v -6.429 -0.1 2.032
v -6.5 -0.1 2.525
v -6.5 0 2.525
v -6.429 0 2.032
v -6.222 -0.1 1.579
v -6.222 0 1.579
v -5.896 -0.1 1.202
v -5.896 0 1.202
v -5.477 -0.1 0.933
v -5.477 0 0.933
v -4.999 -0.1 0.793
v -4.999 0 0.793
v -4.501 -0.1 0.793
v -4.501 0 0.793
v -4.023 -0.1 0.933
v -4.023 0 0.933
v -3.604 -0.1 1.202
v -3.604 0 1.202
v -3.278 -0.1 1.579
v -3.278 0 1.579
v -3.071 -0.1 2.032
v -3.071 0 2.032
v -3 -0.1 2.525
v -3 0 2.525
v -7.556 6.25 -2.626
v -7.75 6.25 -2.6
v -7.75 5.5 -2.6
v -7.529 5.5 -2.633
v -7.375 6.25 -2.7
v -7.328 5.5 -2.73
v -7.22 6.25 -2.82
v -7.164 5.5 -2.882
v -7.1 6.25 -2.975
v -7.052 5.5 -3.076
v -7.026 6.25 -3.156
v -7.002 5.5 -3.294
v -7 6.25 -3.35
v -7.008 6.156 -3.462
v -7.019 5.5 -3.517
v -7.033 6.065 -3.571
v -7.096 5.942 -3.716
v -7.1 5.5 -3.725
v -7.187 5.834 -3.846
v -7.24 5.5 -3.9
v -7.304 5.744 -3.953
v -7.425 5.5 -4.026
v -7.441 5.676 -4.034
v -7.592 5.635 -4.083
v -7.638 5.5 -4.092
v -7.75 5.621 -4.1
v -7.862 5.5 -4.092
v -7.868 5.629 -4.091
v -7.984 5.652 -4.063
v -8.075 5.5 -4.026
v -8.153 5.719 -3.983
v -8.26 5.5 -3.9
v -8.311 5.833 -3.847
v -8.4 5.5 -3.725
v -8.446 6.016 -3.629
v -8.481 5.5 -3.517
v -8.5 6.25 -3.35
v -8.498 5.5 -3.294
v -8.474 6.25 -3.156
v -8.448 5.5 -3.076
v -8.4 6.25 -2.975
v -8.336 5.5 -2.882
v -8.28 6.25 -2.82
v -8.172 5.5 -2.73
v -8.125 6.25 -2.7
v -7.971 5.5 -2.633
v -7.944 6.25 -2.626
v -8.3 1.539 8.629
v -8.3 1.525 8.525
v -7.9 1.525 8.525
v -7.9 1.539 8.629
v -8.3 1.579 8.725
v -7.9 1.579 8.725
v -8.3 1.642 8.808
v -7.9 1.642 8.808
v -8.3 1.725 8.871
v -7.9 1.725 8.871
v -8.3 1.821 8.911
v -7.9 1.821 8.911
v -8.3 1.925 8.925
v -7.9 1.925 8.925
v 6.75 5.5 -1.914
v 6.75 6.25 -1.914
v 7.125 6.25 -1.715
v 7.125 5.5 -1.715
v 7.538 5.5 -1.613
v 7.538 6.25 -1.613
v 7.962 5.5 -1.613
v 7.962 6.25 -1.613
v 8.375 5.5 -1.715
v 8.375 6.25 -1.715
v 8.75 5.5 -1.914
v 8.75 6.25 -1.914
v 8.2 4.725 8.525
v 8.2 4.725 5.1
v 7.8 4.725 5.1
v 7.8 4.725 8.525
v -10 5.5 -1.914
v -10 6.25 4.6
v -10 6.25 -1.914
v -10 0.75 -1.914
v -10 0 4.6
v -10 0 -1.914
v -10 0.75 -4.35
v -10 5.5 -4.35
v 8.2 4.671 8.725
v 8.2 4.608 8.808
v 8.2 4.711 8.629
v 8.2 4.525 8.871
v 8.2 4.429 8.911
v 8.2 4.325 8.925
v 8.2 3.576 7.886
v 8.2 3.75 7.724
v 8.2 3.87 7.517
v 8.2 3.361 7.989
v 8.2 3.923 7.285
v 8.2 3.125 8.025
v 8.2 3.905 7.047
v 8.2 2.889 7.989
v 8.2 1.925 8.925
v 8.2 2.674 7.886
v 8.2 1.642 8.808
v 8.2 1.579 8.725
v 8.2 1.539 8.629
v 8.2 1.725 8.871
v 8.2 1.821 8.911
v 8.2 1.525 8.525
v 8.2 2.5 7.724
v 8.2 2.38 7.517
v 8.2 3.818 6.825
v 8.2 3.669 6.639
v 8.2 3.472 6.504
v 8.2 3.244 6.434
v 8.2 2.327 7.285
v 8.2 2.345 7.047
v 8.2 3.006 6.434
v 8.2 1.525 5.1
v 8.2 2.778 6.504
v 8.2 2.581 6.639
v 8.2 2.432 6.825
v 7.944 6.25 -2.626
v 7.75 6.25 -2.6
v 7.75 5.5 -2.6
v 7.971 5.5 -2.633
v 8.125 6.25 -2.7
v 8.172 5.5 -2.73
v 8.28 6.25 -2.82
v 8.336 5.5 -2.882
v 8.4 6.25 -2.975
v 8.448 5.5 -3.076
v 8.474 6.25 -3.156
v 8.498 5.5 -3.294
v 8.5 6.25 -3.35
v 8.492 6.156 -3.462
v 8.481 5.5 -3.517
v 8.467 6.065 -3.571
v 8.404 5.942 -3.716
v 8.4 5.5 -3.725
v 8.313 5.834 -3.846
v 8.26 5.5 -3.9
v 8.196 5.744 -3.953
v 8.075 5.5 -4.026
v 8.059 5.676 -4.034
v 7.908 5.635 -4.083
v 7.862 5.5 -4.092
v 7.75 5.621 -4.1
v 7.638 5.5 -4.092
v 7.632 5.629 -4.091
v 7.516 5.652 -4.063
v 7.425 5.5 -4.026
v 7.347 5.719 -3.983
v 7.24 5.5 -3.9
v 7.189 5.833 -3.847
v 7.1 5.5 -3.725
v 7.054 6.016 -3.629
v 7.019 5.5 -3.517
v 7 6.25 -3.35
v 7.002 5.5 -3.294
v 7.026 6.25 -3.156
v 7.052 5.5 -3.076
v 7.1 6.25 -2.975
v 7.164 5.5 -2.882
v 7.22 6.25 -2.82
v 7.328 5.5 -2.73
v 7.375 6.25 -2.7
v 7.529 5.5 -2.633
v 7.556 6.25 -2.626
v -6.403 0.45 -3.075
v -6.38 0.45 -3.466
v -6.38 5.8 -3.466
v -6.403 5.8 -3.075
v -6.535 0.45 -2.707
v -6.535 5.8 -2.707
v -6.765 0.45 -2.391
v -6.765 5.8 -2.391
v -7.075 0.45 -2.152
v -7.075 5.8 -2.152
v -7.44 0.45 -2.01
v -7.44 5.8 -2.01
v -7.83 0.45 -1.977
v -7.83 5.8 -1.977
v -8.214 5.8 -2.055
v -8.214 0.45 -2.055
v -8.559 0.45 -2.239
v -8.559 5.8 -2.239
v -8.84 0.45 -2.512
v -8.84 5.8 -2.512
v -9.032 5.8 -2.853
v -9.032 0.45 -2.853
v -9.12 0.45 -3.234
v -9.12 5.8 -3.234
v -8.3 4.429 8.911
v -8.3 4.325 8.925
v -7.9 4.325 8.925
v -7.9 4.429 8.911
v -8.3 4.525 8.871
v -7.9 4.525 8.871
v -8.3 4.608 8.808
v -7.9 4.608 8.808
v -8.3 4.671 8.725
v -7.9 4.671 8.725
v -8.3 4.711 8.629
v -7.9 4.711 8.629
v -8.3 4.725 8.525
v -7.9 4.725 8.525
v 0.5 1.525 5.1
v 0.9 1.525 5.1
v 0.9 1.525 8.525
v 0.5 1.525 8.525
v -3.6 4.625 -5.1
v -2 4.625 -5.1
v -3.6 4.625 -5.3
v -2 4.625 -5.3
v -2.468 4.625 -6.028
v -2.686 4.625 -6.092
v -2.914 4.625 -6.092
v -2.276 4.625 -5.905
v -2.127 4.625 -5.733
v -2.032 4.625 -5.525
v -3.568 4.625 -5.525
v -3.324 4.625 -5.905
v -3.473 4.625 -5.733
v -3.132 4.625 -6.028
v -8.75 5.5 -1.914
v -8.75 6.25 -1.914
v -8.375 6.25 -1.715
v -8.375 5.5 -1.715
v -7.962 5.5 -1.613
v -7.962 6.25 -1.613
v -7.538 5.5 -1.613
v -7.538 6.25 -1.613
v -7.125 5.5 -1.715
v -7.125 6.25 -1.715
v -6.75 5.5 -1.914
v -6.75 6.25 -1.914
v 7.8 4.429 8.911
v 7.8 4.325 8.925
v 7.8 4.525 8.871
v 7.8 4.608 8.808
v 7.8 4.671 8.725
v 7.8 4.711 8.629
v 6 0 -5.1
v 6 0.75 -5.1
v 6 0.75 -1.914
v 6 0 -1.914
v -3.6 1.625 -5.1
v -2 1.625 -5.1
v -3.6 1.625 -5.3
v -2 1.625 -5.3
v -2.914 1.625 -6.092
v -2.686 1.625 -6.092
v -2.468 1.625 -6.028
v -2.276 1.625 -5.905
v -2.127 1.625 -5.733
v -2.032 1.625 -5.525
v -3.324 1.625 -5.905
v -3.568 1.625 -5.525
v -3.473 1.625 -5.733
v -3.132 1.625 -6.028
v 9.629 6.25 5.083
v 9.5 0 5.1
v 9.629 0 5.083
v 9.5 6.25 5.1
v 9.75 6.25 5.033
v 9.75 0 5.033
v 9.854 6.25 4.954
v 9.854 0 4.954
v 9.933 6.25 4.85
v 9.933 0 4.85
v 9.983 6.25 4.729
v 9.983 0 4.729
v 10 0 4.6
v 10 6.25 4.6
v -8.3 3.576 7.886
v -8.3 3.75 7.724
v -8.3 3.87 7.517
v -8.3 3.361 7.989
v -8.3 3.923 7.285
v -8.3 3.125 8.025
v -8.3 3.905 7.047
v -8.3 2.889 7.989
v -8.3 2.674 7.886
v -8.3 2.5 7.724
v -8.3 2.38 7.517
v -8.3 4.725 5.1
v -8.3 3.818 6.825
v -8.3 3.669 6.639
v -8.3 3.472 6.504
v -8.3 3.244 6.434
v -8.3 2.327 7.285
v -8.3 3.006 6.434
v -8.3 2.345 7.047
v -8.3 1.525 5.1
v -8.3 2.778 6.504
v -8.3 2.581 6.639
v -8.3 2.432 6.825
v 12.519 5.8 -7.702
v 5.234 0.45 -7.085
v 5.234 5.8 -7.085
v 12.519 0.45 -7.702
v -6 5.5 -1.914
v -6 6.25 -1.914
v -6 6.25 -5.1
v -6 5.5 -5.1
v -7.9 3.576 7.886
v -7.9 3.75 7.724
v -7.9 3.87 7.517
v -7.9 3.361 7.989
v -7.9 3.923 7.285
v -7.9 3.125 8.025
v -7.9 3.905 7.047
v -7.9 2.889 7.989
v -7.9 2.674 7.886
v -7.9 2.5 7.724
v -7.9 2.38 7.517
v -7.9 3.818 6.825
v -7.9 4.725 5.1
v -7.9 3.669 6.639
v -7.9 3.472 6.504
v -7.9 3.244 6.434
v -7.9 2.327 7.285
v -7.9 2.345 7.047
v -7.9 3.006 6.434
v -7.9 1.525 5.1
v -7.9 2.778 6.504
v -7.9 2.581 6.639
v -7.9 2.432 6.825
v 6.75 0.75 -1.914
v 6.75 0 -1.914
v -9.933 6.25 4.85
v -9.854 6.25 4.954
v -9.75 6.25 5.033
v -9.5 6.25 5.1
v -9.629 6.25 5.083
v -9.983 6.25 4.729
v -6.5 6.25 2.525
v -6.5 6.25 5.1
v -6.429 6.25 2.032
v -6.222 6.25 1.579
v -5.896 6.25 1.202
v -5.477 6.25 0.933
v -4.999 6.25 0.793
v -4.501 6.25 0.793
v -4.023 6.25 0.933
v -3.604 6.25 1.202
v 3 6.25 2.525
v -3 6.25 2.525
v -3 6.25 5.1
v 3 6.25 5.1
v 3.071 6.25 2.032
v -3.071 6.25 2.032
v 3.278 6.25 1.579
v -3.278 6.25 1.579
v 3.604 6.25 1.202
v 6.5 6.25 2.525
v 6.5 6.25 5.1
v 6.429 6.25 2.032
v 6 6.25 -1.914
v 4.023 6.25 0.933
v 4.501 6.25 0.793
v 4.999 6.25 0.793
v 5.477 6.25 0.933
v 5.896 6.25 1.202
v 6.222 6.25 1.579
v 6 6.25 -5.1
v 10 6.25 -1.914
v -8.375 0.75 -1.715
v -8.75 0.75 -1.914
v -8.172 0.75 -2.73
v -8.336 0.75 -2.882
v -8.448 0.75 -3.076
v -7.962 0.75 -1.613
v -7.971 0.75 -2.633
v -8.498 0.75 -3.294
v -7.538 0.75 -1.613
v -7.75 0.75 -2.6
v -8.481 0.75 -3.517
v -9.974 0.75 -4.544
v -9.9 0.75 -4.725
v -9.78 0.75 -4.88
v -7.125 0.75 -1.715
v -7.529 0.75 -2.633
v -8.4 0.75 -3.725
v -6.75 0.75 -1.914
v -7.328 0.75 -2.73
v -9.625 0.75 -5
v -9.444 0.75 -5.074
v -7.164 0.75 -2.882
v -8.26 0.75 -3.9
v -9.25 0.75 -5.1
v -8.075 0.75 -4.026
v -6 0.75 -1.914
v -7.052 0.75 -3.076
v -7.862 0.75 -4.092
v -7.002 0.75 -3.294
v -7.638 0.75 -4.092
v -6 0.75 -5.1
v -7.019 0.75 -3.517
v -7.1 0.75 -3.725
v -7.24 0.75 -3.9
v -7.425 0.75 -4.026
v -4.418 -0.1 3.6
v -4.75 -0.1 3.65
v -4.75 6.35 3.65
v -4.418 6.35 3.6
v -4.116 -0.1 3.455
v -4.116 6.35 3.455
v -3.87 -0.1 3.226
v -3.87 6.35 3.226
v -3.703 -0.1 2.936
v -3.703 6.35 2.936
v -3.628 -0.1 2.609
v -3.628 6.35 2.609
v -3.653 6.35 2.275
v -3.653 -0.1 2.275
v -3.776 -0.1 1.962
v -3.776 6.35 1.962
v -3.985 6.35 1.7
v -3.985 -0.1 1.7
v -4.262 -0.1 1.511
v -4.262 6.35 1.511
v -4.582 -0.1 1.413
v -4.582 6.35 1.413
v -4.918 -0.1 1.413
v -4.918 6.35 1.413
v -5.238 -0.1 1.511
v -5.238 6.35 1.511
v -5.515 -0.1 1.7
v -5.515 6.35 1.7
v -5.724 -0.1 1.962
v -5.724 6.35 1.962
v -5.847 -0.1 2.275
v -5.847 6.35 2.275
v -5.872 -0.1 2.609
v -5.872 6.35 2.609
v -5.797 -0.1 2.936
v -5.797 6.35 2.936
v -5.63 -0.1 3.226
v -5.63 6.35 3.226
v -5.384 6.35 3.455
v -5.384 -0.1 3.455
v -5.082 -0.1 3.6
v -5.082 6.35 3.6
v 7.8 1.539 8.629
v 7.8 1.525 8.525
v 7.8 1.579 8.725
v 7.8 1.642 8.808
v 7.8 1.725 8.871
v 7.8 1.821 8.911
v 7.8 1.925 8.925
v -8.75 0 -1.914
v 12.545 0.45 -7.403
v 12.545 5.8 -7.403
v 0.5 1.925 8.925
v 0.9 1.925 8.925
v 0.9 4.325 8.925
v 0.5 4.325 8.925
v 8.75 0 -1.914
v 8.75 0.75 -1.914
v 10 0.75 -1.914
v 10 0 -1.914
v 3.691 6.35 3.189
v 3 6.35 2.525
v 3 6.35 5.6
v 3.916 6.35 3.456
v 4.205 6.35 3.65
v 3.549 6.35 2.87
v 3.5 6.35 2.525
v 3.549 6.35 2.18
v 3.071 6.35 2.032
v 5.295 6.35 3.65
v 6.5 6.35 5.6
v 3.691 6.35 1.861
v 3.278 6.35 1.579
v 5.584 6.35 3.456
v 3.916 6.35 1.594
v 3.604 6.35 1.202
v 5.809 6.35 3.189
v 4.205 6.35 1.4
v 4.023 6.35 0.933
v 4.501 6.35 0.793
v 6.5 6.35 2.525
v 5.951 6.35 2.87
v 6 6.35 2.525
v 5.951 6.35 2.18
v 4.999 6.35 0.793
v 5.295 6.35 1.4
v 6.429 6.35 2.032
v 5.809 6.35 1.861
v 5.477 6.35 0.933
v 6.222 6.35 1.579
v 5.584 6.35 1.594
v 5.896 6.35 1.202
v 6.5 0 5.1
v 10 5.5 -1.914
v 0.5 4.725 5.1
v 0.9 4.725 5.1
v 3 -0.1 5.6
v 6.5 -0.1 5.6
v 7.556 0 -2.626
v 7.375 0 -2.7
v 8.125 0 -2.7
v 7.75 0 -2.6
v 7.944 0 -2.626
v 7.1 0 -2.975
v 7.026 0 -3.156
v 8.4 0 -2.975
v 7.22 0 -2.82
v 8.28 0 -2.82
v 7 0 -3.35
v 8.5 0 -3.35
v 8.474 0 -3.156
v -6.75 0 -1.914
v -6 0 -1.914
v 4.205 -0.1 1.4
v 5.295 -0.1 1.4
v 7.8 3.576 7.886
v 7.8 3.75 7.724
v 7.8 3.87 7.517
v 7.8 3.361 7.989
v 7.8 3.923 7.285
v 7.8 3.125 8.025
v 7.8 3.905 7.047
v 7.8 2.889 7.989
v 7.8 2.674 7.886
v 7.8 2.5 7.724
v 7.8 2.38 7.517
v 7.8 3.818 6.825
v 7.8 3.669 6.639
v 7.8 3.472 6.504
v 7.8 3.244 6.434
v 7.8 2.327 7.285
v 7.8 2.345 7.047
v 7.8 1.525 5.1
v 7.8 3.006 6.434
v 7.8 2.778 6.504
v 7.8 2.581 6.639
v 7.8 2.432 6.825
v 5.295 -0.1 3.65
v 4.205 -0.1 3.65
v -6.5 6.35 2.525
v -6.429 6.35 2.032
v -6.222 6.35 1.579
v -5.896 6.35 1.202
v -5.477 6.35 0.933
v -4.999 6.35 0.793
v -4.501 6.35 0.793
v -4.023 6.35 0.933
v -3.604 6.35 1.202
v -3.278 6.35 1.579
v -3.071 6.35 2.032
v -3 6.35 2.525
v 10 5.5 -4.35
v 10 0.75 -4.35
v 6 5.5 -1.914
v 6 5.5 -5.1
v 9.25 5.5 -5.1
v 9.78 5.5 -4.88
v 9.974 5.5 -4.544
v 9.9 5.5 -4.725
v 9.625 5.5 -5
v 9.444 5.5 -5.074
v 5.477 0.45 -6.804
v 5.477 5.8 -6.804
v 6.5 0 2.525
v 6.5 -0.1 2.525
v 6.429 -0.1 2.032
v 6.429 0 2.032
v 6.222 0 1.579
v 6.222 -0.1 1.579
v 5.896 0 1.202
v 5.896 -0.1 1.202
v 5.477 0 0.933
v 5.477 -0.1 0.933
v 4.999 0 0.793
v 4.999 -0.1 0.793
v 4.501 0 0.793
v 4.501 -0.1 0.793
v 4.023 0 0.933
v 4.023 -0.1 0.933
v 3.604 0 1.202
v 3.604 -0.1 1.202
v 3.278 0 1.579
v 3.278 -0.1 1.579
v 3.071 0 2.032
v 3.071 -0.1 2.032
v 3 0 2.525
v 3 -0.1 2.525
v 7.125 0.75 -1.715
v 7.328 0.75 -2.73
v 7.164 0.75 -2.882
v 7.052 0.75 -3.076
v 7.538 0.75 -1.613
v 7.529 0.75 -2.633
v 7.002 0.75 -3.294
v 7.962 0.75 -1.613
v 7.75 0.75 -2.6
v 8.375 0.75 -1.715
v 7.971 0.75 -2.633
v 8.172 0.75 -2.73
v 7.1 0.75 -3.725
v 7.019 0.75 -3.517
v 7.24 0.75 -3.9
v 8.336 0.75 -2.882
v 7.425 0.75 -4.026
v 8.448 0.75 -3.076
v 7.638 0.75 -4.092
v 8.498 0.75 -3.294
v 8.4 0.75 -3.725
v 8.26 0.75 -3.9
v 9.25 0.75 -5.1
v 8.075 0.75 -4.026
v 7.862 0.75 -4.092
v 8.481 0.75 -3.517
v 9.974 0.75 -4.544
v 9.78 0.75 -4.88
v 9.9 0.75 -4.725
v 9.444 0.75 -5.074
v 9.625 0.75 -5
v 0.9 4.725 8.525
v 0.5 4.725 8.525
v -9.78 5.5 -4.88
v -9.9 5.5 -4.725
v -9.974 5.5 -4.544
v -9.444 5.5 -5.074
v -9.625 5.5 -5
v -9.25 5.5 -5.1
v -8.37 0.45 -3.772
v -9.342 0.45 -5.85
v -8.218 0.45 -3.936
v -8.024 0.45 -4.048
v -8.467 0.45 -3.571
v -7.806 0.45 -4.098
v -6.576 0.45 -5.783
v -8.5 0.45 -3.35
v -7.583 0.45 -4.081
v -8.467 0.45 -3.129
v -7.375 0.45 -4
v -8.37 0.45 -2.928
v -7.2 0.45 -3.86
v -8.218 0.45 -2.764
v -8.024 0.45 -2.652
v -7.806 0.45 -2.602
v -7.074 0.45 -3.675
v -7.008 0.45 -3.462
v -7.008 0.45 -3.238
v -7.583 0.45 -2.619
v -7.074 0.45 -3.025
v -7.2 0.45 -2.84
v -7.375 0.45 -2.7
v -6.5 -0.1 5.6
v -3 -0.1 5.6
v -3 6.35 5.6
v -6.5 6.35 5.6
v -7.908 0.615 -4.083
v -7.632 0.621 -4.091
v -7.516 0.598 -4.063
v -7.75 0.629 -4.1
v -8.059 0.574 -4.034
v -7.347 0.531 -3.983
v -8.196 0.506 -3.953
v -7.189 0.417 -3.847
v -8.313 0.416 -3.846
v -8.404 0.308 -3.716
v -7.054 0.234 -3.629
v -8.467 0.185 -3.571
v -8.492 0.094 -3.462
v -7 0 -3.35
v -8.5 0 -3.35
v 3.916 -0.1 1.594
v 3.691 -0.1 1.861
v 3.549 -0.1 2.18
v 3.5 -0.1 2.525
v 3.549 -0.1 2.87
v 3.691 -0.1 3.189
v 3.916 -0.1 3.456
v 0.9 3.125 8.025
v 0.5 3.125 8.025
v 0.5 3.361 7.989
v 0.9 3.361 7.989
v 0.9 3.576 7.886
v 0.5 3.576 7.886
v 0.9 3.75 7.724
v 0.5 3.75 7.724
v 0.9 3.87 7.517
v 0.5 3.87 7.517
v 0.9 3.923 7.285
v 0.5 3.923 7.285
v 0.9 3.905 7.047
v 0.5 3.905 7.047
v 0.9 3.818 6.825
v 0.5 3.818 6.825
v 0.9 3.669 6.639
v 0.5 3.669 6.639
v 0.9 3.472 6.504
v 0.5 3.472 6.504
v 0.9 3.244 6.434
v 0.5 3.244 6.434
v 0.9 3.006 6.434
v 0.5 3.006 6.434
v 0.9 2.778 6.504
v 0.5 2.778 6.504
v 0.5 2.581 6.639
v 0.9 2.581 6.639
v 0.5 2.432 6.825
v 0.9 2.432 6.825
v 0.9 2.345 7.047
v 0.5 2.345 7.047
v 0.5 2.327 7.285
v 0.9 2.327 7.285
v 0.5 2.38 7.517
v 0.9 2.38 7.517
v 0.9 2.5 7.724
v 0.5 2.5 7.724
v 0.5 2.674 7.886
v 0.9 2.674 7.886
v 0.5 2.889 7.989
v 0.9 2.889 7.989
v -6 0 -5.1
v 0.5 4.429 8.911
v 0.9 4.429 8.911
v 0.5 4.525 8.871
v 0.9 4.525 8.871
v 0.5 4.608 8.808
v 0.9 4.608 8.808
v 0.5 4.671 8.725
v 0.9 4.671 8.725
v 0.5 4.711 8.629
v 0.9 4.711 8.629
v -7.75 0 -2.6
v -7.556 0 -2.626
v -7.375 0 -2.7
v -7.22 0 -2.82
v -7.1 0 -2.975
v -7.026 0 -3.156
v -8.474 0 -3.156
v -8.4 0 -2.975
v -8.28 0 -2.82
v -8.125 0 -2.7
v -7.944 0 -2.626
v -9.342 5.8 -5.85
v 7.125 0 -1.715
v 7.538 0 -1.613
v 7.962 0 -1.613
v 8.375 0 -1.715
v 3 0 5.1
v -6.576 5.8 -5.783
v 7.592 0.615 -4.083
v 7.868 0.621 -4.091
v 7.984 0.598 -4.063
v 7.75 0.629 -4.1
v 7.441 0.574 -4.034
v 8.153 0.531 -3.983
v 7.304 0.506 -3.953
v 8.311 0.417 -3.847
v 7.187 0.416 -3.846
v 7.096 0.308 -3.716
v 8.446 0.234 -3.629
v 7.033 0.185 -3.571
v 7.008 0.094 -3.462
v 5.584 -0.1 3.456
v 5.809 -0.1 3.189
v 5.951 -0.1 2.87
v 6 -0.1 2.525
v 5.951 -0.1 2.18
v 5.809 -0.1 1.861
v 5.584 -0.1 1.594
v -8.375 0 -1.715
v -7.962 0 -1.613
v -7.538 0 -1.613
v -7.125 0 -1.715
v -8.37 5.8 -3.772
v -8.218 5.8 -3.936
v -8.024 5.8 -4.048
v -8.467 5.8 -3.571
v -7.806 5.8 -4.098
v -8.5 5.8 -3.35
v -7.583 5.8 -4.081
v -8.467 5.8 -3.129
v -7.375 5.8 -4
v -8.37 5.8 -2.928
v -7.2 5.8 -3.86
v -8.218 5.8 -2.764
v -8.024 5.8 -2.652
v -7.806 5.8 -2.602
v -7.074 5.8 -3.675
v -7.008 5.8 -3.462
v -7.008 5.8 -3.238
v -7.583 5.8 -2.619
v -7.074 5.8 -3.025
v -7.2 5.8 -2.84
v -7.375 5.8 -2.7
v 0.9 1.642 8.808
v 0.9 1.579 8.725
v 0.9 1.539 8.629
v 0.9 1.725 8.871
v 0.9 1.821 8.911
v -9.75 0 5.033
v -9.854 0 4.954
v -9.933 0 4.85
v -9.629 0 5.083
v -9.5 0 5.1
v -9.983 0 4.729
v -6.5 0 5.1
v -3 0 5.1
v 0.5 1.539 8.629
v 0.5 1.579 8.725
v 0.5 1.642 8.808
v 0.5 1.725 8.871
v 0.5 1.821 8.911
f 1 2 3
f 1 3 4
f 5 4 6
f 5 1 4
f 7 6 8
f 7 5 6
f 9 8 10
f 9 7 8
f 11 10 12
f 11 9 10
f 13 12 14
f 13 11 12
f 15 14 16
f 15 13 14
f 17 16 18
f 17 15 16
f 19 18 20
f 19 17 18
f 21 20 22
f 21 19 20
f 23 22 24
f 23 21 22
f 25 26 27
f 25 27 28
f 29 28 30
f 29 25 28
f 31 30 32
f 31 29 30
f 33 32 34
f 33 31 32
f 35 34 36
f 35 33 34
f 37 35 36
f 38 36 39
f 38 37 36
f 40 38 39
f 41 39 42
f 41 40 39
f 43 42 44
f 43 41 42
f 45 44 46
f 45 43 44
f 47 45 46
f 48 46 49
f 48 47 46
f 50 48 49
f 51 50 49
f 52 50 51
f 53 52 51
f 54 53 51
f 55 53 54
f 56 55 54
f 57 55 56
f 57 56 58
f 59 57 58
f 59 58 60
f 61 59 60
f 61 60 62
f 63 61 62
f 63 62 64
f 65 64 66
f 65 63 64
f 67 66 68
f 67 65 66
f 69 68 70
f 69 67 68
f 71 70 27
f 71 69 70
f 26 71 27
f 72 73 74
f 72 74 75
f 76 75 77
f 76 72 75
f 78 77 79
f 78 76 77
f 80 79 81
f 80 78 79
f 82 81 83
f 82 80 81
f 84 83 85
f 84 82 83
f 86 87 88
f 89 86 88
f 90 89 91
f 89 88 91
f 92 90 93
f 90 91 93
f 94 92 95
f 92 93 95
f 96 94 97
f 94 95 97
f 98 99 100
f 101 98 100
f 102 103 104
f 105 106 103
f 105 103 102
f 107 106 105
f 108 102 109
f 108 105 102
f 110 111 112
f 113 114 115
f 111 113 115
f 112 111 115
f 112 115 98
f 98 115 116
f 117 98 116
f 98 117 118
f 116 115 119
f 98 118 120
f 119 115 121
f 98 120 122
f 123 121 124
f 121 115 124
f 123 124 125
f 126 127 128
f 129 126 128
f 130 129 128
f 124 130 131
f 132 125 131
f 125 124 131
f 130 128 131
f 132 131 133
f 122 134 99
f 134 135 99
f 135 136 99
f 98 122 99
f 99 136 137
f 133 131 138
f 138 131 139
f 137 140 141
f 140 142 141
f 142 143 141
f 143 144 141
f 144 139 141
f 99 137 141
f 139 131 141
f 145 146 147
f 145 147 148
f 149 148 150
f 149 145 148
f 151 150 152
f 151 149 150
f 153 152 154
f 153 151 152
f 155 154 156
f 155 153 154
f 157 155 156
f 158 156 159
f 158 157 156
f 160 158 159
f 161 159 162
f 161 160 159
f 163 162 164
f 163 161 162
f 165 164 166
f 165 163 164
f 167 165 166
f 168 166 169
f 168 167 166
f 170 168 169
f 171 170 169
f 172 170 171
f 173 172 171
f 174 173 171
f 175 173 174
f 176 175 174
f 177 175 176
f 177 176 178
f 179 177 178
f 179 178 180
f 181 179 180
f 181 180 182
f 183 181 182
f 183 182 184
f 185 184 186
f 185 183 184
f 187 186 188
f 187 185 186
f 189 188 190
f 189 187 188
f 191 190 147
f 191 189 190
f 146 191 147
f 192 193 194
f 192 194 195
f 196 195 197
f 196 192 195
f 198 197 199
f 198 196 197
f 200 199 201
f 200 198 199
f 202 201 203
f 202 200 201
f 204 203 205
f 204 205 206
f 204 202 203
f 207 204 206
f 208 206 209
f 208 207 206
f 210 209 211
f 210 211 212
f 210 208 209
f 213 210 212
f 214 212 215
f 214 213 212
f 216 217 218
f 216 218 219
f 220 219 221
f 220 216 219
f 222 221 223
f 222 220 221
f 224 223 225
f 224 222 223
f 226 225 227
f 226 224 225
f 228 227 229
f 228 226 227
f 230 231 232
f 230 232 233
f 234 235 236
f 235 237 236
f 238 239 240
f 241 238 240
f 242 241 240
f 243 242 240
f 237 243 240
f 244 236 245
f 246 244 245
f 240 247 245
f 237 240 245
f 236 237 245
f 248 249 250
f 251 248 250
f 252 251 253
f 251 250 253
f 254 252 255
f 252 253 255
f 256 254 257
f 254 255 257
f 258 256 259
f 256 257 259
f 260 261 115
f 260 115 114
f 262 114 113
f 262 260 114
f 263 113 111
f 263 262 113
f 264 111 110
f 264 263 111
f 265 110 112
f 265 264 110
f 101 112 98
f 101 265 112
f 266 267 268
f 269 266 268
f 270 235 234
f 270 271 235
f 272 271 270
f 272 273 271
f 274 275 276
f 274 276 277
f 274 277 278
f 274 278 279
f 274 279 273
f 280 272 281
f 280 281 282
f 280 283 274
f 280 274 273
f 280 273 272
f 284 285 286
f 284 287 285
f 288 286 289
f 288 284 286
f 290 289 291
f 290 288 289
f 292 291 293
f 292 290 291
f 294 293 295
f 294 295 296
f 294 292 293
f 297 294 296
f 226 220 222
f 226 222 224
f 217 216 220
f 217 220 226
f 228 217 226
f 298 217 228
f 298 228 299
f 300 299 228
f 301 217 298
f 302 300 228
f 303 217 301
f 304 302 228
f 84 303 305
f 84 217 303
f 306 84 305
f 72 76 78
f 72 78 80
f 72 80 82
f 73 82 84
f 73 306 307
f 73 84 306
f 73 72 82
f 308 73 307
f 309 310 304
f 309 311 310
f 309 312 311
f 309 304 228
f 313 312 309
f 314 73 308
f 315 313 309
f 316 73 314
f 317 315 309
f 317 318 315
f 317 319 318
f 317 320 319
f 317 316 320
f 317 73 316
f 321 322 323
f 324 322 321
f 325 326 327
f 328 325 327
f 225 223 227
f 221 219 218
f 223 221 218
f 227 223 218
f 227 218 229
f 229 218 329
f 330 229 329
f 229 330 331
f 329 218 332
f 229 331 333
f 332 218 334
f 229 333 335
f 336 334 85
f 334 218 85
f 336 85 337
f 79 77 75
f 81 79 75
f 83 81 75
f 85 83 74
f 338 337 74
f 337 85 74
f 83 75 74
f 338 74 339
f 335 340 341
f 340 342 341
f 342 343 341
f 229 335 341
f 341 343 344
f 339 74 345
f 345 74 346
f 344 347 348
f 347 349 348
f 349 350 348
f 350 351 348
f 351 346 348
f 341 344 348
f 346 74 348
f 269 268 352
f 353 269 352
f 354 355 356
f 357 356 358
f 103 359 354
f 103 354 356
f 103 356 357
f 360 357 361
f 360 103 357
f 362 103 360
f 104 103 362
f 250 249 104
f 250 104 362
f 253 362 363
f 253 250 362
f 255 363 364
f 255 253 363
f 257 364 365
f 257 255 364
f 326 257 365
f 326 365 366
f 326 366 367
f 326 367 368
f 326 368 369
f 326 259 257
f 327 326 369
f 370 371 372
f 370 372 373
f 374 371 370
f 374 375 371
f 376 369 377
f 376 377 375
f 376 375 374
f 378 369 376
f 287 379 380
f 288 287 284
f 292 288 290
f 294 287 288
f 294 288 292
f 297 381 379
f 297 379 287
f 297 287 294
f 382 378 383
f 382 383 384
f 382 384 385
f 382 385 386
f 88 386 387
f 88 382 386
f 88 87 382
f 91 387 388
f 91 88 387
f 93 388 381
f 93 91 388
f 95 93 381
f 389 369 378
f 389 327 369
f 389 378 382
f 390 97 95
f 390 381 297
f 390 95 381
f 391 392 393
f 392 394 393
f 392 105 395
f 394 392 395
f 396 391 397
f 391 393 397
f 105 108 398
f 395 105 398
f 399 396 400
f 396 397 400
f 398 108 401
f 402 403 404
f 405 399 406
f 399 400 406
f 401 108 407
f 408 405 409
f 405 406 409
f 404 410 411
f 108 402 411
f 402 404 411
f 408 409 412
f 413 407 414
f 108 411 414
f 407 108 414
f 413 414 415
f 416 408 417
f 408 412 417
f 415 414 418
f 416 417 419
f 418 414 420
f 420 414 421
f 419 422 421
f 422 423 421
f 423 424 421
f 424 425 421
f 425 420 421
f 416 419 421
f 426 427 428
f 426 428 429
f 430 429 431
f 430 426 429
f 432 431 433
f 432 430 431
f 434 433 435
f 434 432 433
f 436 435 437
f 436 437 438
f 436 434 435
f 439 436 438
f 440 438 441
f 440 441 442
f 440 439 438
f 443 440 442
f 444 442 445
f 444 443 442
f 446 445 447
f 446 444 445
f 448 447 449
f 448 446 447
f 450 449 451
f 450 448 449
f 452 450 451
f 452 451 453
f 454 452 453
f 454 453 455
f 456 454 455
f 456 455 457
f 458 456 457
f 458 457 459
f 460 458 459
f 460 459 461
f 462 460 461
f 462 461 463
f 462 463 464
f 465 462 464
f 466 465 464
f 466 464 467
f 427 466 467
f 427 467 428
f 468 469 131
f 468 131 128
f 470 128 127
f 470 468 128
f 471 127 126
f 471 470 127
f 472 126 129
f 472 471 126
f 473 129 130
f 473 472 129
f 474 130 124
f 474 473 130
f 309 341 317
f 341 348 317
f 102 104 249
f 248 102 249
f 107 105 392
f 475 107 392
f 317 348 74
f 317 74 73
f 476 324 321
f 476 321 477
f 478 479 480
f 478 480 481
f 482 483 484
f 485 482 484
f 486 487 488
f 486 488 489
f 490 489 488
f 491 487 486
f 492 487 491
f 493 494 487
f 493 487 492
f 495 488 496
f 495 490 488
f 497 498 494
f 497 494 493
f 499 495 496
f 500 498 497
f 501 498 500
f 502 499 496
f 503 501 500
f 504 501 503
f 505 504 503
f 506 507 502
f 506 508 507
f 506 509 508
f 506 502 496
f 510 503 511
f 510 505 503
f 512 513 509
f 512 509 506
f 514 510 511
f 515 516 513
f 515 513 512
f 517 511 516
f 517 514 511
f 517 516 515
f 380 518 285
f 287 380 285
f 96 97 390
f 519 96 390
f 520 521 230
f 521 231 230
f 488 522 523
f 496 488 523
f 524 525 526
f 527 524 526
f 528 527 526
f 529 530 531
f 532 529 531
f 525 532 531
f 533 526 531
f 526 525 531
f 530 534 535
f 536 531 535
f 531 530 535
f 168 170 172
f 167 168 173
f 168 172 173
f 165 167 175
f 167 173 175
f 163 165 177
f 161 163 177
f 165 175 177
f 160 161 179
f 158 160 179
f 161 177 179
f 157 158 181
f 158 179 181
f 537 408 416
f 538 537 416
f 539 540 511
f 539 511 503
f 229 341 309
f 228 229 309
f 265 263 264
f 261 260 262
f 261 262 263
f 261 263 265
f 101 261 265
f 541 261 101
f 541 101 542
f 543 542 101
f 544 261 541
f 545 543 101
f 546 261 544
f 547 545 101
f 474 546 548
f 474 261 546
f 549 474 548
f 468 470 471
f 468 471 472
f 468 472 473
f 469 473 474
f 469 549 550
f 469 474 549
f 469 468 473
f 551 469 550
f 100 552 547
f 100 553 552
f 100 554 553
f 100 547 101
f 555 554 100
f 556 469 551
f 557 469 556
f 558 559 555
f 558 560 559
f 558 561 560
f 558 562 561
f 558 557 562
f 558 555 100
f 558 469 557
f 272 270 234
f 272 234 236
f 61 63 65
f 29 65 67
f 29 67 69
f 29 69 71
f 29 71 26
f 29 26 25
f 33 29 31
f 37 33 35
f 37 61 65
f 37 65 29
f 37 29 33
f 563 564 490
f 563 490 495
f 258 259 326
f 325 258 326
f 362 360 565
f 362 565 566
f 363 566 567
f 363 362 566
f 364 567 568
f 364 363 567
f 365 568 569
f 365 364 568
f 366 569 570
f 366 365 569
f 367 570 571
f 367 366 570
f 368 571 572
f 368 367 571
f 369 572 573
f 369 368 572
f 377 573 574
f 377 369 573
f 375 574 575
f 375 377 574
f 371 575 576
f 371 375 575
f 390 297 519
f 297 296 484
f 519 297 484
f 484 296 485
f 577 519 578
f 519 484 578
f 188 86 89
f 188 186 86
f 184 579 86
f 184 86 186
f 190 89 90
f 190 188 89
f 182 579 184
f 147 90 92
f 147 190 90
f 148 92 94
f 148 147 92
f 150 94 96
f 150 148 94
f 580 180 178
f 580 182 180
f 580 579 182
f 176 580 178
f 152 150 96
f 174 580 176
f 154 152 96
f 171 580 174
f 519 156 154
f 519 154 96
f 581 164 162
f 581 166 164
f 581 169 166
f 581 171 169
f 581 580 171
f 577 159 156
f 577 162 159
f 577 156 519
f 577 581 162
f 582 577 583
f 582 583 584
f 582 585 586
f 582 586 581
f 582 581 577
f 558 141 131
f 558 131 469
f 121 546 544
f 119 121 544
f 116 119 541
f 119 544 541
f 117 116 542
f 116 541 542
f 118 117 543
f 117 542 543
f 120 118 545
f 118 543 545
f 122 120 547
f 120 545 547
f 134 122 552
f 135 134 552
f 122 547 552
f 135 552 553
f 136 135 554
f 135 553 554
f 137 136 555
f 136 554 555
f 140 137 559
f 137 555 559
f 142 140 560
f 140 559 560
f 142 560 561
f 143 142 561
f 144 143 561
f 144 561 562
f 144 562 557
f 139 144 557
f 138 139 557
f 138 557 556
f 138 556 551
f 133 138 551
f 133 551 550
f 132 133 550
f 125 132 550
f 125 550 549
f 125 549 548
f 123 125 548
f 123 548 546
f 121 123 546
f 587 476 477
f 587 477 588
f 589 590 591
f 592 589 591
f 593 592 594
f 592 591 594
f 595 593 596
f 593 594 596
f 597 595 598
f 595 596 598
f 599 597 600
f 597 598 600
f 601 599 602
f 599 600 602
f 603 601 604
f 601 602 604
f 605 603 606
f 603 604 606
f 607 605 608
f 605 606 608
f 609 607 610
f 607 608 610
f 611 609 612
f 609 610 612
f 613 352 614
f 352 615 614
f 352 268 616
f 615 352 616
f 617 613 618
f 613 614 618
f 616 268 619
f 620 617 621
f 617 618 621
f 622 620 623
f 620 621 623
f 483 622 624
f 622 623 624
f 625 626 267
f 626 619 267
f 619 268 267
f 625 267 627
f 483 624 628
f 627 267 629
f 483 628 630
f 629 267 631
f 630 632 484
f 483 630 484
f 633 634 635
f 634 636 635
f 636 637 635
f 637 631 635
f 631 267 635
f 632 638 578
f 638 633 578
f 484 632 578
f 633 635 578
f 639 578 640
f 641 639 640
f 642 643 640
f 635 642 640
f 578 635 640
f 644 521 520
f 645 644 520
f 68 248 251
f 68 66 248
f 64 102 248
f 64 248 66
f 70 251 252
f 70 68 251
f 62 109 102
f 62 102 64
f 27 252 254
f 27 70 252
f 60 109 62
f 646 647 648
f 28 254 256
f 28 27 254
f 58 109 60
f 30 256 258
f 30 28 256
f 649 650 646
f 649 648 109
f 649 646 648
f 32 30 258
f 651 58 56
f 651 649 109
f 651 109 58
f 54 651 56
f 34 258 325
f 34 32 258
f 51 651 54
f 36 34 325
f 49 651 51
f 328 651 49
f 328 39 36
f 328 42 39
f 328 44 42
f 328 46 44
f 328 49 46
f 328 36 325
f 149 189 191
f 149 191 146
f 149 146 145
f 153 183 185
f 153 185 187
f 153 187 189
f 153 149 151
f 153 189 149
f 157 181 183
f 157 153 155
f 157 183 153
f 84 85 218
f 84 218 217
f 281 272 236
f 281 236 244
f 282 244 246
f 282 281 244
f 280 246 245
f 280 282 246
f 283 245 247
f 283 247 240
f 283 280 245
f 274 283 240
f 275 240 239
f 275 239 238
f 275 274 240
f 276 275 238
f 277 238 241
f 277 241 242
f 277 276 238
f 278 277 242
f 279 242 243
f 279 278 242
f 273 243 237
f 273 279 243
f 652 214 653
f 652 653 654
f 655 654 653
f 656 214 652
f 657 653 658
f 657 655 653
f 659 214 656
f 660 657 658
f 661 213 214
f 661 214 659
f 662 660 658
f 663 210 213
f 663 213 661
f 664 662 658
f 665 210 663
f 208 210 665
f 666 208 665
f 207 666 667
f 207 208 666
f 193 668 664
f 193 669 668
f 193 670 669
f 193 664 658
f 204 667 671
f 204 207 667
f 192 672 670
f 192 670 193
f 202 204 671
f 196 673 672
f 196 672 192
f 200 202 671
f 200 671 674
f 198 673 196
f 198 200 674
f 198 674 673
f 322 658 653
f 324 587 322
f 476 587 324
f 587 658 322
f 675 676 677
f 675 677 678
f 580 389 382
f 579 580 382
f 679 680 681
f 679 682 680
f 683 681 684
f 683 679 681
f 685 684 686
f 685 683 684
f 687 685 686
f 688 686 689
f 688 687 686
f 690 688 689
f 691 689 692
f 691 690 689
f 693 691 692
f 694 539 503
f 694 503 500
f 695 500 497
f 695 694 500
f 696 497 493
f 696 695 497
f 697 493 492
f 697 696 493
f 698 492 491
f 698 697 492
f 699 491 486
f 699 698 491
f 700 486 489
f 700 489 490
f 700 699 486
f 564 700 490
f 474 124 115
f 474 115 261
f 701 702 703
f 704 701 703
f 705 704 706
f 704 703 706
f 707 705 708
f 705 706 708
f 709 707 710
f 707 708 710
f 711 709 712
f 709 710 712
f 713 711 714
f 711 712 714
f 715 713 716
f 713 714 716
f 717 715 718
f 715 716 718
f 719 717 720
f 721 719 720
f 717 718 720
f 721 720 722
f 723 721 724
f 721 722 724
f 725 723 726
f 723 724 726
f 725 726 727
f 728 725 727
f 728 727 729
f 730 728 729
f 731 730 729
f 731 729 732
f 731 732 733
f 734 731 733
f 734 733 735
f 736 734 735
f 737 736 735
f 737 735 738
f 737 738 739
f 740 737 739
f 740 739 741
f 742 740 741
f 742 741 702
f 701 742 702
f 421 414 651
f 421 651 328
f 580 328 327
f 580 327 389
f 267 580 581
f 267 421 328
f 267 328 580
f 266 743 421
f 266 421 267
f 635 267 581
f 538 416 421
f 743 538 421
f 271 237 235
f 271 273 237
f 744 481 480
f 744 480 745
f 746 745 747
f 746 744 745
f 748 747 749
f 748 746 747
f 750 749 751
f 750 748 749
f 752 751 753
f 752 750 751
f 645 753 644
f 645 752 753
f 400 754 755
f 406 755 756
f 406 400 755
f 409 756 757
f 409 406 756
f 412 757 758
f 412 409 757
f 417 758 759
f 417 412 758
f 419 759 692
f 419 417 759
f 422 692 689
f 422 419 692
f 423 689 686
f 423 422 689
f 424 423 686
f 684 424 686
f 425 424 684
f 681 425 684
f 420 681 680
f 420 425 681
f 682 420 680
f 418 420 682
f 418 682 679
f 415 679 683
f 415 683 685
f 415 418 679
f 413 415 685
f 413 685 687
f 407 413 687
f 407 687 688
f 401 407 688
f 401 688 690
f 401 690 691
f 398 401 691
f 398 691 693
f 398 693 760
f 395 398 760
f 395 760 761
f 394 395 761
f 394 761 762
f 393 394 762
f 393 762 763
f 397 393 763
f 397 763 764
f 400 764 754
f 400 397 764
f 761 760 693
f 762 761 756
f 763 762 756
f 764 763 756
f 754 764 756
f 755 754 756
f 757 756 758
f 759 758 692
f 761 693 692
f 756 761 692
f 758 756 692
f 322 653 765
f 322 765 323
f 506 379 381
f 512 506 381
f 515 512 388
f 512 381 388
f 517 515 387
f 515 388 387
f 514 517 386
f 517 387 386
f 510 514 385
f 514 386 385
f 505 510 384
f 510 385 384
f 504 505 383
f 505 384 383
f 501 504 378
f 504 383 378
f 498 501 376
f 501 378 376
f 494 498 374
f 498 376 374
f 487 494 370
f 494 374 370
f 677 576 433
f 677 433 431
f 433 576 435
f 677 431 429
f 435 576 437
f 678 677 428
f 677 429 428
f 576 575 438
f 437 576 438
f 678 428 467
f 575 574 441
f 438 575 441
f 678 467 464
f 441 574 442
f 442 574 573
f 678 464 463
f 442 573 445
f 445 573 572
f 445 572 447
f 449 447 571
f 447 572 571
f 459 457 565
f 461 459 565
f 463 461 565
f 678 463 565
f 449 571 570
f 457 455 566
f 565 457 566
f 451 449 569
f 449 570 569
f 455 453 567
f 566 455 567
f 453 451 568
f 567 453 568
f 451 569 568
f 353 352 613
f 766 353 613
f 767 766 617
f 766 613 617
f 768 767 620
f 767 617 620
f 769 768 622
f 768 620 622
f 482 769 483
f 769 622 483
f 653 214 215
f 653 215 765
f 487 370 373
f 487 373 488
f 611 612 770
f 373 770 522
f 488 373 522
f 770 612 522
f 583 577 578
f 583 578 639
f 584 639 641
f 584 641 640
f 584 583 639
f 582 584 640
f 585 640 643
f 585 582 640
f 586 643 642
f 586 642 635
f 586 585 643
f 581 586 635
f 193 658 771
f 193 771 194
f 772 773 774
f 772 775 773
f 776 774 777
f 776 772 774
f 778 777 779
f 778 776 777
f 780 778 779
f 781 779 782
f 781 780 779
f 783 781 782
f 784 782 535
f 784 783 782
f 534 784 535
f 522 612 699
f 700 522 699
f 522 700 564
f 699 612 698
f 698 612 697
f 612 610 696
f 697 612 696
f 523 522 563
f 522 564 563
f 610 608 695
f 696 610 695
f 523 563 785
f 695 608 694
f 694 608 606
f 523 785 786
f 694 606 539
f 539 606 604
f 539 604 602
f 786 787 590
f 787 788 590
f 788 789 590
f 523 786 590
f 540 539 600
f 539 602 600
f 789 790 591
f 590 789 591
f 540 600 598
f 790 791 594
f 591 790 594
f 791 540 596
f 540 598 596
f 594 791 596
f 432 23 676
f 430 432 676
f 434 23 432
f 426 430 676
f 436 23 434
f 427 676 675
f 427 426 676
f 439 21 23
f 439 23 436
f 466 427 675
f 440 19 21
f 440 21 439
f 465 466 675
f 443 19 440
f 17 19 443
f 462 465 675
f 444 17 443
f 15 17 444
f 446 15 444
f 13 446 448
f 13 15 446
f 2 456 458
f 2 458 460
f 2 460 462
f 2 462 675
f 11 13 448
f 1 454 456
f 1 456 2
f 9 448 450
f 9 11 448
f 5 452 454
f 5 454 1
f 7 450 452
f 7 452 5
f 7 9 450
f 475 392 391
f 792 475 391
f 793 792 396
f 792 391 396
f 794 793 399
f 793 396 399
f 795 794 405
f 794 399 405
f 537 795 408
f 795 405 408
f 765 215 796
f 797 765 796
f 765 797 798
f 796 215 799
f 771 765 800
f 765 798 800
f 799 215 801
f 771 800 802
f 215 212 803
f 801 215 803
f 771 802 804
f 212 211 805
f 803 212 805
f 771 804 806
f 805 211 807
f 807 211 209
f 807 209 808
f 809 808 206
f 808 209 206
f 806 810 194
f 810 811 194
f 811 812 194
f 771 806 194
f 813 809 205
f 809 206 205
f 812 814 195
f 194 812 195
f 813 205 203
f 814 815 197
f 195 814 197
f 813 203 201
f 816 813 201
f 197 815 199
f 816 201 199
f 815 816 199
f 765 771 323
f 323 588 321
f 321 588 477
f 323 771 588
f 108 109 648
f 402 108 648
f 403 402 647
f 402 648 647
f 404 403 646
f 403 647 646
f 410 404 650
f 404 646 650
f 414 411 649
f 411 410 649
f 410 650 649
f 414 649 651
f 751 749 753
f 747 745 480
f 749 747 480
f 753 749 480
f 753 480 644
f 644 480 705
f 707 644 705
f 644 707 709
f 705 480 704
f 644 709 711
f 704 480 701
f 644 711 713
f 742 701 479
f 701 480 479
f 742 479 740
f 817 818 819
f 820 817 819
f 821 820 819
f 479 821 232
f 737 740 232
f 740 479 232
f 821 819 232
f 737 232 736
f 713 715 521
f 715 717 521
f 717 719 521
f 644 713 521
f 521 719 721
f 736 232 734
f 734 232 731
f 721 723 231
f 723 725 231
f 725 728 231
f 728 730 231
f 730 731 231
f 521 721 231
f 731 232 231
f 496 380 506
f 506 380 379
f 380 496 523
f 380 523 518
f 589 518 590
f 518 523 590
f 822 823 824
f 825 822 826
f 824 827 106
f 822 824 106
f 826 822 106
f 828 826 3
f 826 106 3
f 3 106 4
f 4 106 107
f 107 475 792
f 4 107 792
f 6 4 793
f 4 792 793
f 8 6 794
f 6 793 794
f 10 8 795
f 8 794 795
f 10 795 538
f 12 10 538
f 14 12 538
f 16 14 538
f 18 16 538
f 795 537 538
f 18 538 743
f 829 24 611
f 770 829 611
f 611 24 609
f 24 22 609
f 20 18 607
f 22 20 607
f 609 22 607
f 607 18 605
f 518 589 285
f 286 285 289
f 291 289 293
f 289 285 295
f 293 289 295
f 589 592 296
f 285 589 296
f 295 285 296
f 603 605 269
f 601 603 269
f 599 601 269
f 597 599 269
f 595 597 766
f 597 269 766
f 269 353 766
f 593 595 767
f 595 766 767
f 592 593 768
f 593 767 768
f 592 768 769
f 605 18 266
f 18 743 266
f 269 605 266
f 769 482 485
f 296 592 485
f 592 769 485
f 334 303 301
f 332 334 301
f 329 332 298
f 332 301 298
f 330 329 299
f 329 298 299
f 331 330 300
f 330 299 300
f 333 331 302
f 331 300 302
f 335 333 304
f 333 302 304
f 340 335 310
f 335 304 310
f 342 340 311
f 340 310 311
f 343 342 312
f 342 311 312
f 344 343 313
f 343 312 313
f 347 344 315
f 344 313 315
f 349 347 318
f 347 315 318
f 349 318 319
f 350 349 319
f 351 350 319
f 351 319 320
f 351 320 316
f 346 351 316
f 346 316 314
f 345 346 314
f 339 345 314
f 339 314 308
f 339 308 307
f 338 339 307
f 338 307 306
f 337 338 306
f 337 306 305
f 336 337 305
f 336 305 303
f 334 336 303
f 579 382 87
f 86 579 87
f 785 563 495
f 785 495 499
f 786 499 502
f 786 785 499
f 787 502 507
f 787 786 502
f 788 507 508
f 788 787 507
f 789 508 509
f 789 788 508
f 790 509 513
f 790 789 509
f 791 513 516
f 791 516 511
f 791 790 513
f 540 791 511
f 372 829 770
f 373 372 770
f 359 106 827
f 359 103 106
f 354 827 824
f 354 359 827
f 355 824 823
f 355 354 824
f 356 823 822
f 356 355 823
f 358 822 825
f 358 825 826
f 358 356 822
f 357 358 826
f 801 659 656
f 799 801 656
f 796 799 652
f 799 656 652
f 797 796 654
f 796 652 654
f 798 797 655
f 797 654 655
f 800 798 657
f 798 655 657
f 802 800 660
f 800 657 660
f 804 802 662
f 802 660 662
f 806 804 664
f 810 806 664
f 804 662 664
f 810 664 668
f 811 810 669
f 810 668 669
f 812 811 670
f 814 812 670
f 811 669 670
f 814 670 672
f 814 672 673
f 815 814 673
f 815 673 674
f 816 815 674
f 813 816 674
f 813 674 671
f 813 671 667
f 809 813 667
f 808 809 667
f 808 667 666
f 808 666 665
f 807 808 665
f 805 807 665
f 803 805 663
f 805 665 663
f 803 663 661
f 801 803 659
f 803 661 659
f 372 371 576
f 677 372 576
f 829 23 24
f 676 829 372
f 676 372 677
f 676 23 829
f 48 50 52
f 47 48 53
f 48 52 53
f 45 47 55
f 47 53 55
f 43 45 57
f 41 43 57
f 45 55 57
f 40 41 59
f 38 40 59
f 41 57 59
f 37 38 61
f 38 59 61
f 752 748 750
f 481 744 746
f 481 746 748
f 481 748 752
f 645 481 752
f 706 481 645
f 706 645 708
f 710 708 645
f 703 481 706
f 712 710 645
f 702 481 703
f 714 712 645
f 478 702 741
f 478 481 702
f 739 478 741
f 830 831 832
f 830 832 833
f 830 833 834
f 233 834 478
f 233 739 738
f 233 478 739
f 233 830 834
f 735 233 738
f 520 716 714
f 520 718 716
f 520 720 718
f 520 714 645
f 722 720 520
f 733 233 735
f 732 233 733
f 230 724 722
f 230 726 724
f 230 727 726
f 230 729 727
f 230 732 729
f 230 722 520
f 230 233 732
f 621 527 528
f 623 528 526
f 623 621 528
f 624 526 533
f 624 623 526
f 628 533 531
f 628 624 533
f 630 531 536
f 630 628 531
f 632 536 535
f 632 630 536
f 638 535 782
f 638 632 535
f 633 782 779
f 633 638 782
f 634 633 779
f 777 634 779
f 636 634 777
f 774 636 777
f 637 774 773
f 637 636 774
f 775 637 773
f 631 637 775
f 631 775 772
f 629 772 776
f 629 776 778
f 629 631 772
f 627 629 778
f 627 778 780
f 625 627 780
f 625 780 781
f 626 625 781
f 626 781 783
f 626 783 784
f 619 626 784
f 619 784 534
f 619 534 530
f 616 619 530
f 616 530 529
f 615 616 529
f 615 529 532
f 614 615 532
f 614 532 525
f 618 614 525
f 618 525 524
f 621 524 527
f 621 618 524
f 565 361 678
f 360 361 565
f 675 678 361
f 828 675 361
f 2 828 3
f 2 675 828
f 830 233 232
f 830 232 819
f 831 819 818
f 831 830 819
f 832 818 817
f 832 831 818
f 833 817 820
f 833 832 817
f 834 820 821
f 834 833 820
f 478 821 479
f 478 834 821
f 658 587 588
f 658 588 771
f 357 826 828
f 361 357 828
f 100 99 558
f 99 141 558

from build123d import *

# Parameters (mm, degrees)
SKETCH1_W             = 20
SKETCH1_H             = 10.2
BOSS_EXTRUDE1_DEPTH   = 6.25
FILLET1_R             = 0.75
FILLET2_R             = 0.5
SKETCH2_R             = 1.125
CUT_EXTRUDE1_DEPTH    = 13.848054327
BOSS_EXTRUDE2_START   = -6.35
SKETCH3_R             = 1.125
BOSS_EXTRUDE2_DEPTH   = 6.45
SKETCH4_R             = 0.75
CUT_EXTRUDE2_DEPTH    = 0.75
CUT_EXTRUDE3_START    = -5.5
SKETCH4_4_R           = 0.75
CUT_EXTRUDE3_DEPTH    = 0.75
CUT_EXTRUDE4_REACH    = 23.718
CUT_EXTRUDE5_START    = -16
CUT_EXTRUDE5_DEPTH    = 4
BOSS_EXTRUDE4_DEPTH   = 1.5
BOSS_EXTRUDE5_START   = 0.3
BOSS_EXTRUDE5_DEPTH   = 5.35
SKETCH10_W            = 0.4
SKETCH10_H            = 3.825
BOSS_EXTRUDE6_DEPTH   = 1.6
BOSS_EXTRUDE6_2_DEPTH = 1.6
BOSS_EXTRUDE6_3_DEPTH = 1.6
SKETCH11_R            = 0.8
CUT_EXTRUDE8_DEPTH    = 24.547231287


with BuildPart() as part:
    # Sketch1 → Boss-Extrude1 (new body)
    with BuildSketch(Plane(origin=(0, 0, 0), x_dir=(1, 0, 0), z_dir=(0, 1, 0))):
        Rectangle(SKETCH1_W, SKETCH1_H)
    extrude(amount=BOSS_EXTRUDE1_DEPTH)

    # Fillet1
    fillet1_edges = [part.edges().sort_by_distance(p)[0] for p in [
        (-10, 3.125, -5.1),
        (10, 3.125, -5.1),
    ]]
    fillet(fillet1_edges, radius=FILLET1_R)

    # Fillet2
    fillet2_edges = [part.edges().sort_by_distance(p)[0] for p in [
        (10, 3.125, 5.1),
        (-10, 3.125, 5.1),
    ]]
    fillet(fillet2_edges, radius=FILLET2_R)

    # Sketch2 → Cut-Extrude1 (cut, through all)
    with BuildSketch(Plane(origin=(0, 6.25, 0), x_dir=(1, 0, 0), z_dir=(0, 1, 0))):
        with Locations(Location((-4.75, -2.525, 0), (0, 0, 270))):
            Circle(SKETCH2_R)
        with BuildLine():
            Line((5.294862368, -1.4), (4.205137632, -1.4))
            ThreePointArc((4.205137632, -1.4), (3.5, -2.525), (4.205137632, -3.65))
            Line((4.205137632, -3.65), (5.294862368, -3.65))
            ThreePointArc((5.294862368, -3.65), (6, -2.525), (5.294862368, -1.4))
        make_face()
    extrude(amount=-CUT_EXTRUDE1_DEPTH, mode=Mode.SUBTRACT)

    # Sketch3 → Boss-Extrude2 (add)
    # profile 1 of 2: a face of its own
    with BuildSketch(Plane(origin=(0, 6.25, 0), x_dir=(1, 0, 0), z_dir=(0, 1, 0)).offset(BOSS_EXTRUDE2_START)):
        with BuildLine():
            Line((-6.5, -5.1), (-6.5, -2.525))
            ThreePointArc((-6.5, -2.525), (-4.75, -0.775), (-3, -2.525))
            Line((-3, -2.525), (-3, -5.1))
            Line((-3, -5.1), (-3, -5.6))
            Line((-3, -5.6), (-6.5, -5.6))
            Line((-6.5, -5.6), (-6.5, -5.1))
        make_face()
        with Locations(Location((-4.75, -2.525, 0), (0, 0, 270))):
            Circle(SKETCH3_R, mode=Mode.SUBTRACT)
    # profile 2 of 2: a face of its own
    with BuildSketch(Plane(origin=(0, 6.25, 0), x_dir=(1, 0, 0), z_dir=(0, 1, 0)).offset(BOSS_EXTRUDE2_START)):
        with BuildLine():
            Line((6.5, -5.6), (6.5, -5.1))
            Line((6.5, -5.1), (6.5, -2.525))
            ThreePointArc((6.5, -2.525), (4.75, -0.775), (3, -2.525))
            Line((3, -2.525), (3, -5.1))
            Line((3, -5.1), (3, -5.6))
            Line((3, -5.6), (6.5, -5.6))
        make_face()
        with BuildLine():
            Line((4.205137632, -3.65), (5.294862368, -3.65))
            ThreePointArc((5.294862368, -3.65), (6, -2.525), (5.294862368, -1.4))
            Line((5.294862368, -1.4), (4.205137632, -1.4))
            ThreePointArc((4.205137632, -1.4), (3.5, -2.525), (4.205137632, -3.65))
        make_face(mode=Mode.SUBTRACT)
    extrude(amount=BOSS_EXTRUDE2_DEPTH)

    # Sketch4 → Cut-Extrude2 (cut)
    # profile 1 of 2: a face of its own
    with BuildSketch(Plane(origin=(0, 6.25, 0), x_dir=(1, 0, 0), z_dir=(0, 1, 0))):
        with BuildLine():
            Line((-6, 1.913859338), (-6, 5.1))
            Line((-6, 5.1), (-9.25, 5.1))
            ThreePointArc((-9.25, 5.1), (-9.780330086, 4.880330086), (-10, 4.35))
            Line((-10, 4.35), (-10, 1.913859338))
            Line((-10, 1.913859338), (-8.75, 1.913859338))
            ThreePointArc((-8.75, 1.913859338), (-7.75, 1.6), (-6.75, 1.913859338))
            Line((-6.75, 1.913859338), (-6, 1.913859338))
        make_face()
        with Locations(Location((-7.75, 3.35, 0), (0, 0, 270))):
            Circle(SKETCH4_R, mode=Mode.SUBTRACT)
    # profile 2 of 2: a face of its own
    with BuildSketch(Plane(origin=(0, 6.25, 0), x_dir=(1, 0, 0), z_dir=(0, 1, 0))):
        with BuildLine():
            Line((9.25, 5.1), (6, 5.1))
            Line((6, 5.1), (6, 1.913859338))
            Line((6, 1.913859338), (6.75, 1.913859338))
            ThreePointArc((6.75, 1.913859338), (7.75, 1.6), (8.75, 1.913859338))
            Line((8.75, 1.913859338), (10, 1.913859338))
            Line((10, 1.913859338), (10, 4.35))
            ThreePointArc((10, 4.35), (9.780330086, 4.880330086), (9.25, 5.1))
        make_face()
        with Locations(Location((7.75, 3.35, 0), (0, 0, 270))):
            Circle(SKETCH4_R, mode=Mode.SUBTRACT)
    extrude(amount=-CUT_EXTRUDE2_DEPTH, mode=Mode.SUBTRACT)

    # Sketch4<4> → Cut-Extrude3 (cut)
    # profile 1 of 2: a face of its own
    with BuildSketch(Plane(origin=(0, 6.25, 0), x_dir=(1, 0, 0), z_dir=(0, 1, 0)).offset(CUT_EXTRUDE3_START)):
        with BuildLine():
            Line((-6, 1.913859338), (-6, 5.1))
            Line((-6, 5.1), (-9.25, 5.1))
            ThreePointArc((-9.25, 5.1), (-9.780330086, 4.880330086), (-10, 4.35))
            Line((-10, 4.35), (-10, 1.913859338))
            Line((-10, 1.913859338), (-8.75, 1.913859338))
            ThreePointArc((-8.75, 1.913859338), (-7.75, 1.6), (-6.75, 1.913859338))
            Line((-6.75, 1.913859338), (-6, 1.913859338))
        make_face()
        with Locations(Location((-7.75, 3.35, 0), (0, 0, 270))):
            Circle(SKETCH4_4_R, mode=Mode.SUBTRACT)
    # profile 2 of 2: a face of its own
    with BuildSketch(Plane(origin=(0, 6.25, 0), x_dir=(1, 0, 0), z_dir=(0, 1, 0)).offset(CUT_EXTRUDE3_START)):
        with BuildLine():
            Line((9.25, 5.1), (6, 5.1))
            Line((6, 5.1), (6, 1.913859338))
            Line((6, 1.913859338), (6.75, 1.913859338))
            ThreePointArc((6.75, 1.913859338), (7.75, 1.6), (8.75, 1.913859338))
            Line((8.75, 1.913859338), (10, 1.913859338))
            Line((10, 1.913859338), (10, 4.35))
            ThreePointArc((10, 4.35), (9.780330086, 4.880330086), (9.25, 5.1))
        make_face()
        with Locations(Location((7.75, 3.35, 0), (0, 0, 270))):
            Circle(SKETCH4_4_R, mode=Mode.SUBTRACT)
    extrude(amount=-CUT_EXTRUDE3_DEPTH, mode=Mode.SUBTRACT)

    # Cut-Extrude4: up to this face of the body (flat: up to its plane)
    cut_extrude4_end = Plane(part.part.faces().sort_by_distance((-6, 5.875, -3.506929669))[0])
    # Sketch5 → Cut-Extrude4 (cut, up to the picked face)
    with BuildSketch(Plane.ZY.offset(10), mode=Mode.PRIVATE) as cut_extrude4_sk1:
        Polygon((-4.1, 6.25), (-4.1, 5.620675277), (-3.35, 6.25), align=None)
    cut_extrude4_tool1 = split(extrude(cut_extrude4_sk1.sketch, amount=-CUT_EXTRUDE4_REACH, mode=Mode.PRIVATE), bisect_by=cut_extrude4_end, keep=Keep.BOTH, mode=Mode.PRIVATE)
    cut_extrude4 = cut_extrude4_tool1.solids().sort_by(Axis((-10, 6.040225, -3.85), (1, 0, 0)))[0]
    add(cut_extrude4, mode=Mode.SUBTRACT)

    # Sketch5<2> → Cut-Extrude5 (cut)
    with BuildSketch(Plane.ZY.offset(10).offset(CUT_EXTRUDE5_START)):
        Polygon((-4.1, 6.25), (-4.1, 5.620675277), (-3.35, 6.25), align=None)
    cut_extrude5 = extrude(amount=-CUT_EXTRUDE5_DEPTH, mode=Mode.SUBTRACT)

    # Mirror2: Cut-Extrude4, Cut-Extrude5 across plane
    add(cut_extrude4.mirror(Plane(origin=(0, 3.125, 0), x_dir=(0, 0, 1), z_dir=(0, -1, 0))), mode=Mode.SUBTRACT)
    add(cut_extrude5.mirror(Plane(origin=(0, 3.125, 0), x_dir=(0, 0, 1), z_dir=(0, -1, 0))), mode=Mode.SUBTRACT)


with BuildPart() as body_2:
    # Sketch6 → Boss-Extrude4 (new, symmetric)
    with BuildSketch(Plane(origin=(0, 3.125, 0), x_dir=(-1, 0, 0), z_dir=(0, -1, 0))):
        with BuildLine():
            Line((2, 5.1), (3.6, 5.1))
            Line((3.6, 5.1), (3.6, 5.3))
            ThreePointArc((3.6, 5.3), (2.8, 6.1), (2, 5.3))
            Line((2, 5.3), (2, 5.1))
        make_face()
    extrude(amount=BOSS_EXTRUDE4_DEPTH, both=True)


with BuildPart() as body_3:
    # Sketch7 → Boss-Extrude5 (new body)
    with BuildSketch(Plane.XZ.offset(-0.75).offset(BOSS_EXTRUDE5_START)):
        with BuildLine():
            Line((5.477048297, -6.804381566), (-6.576261264, -5.782814703))
            Line((-6.576261264, -5.782814703), (-6.379912037, -3.466120511))
            ThreePointArc((-6.379912037, -3.466120511), (-7.633879489, -1.979912037), (-9.120087963, -3.233879489))
            Line((-9.120087963, -3.233879489), (-9.341772575, -5.849501964))
            Line((-9.341772575, -5.849501964), (5.234355633, -7.084887938))
            Line((5.234355633, -7.084887938), (12.519183711, -7.702306659))
            Line((12.519183711, -7.702306659), (12.544519095, -7.403378376))
            Line((12.544519095, -7.403378376), (5.477048297, -6.804381566))
        make_face()
        with BuildLine():
            ThreePointArc((-7, -3.35), (-7.75, -2.6), (-8.5, -3.35))
            ThreePointArc((-8.5, -3.35), (-7.75, -4.1), (-7, -3.35))
        make_face(mode=Mode.SUBTRACT)
    extrude(amount=-BOSS_EXTRUDE5_DEPTH)


with BuildPart() as body_4:
    # Sketch10 → Boss-Extrude6 (new, symmetric)
    with BuildSketch(Plane(origin=(0, 3.125, 0), x_dir=(-1, 0, 0), z_dir=(0, -1, 0))):
        with Locations((-8, -7.0125)):
            Rectangle(SKETCH10_W, SKETCH10_H)
    extrude(amount=BOSS_EXTRUDE6_DEPTH, both=True)


with BuildPart() as body_5:
    # Sketch10 → Boss-Extrude6 2 (new, symmetric)
    with BuildSketch(Plane(origin=(0, 3.125, 0), x_dir=(-1, 0, 0), z_dir=(0, -1, 0))):
        with Locations((-0.7, -7.0125)):
            Rectangle(SKETCH10_W, SKETCH10_H)
    extrude(amount=BOSS_EXTRUDE6_2_DEPTH, both=True)


with BuildPart() as body_6:
    # Sketch10 → Boss-Extrude6 3 (new, symmetric)
    with BuildSketch(Plane(origin=(0, 3.125, 0), x_dir=(-1, 0, 0), z_dir=(0, -1, 0))):
        with Locations((8.1, -7.0125)):
            Rectangle(SKETCH10_W, SKETCH10_H)
    extrude(amount=BOSS_EXTRUDE6_3_DEPTH, both=True)


with BuildPart() as cut_extrude8_tool:
    # Sketch11 → Cut-Extrude8 (new, through all)
    with BuildSketch(Plane.ZY.offset(8.3)):
        with Locations((7.225, 3.125)):
            Circle(SKETCH11_R)
        with BuildLine():
            Line((8.925, 4.725), (8.925, 4.325))
            ThreePointArc((8.925, 4.325), (8.807842712, 4.607842712), (8.525, 4.725))
            Line((8.525, 4.725), (8.925, 4.725))
        make_face()
        with BuildLine():
            Line((8.925, 1.525), (8.525, 1.525))
            ThreePointArc((8.525, 1.525), (8.807842712, 1.642157288), (8.925, 1.925))
            Line((8.925, 1.925), (8.925, 1.525))
        make_face()
    extrude(amount=-CUT_EXTRUDE8_DEPTH)


with BuildPart() as body_4_1:
    add(body_4.part)

    # Cut-Extrude8: cut by cut_extrude8_tool
    add(cut_extrude8_tool.part, mode=Mode.SUBTRACT)


with BuildPart() as body_5_1:
    add(body_5.part)

    # Cut-Extrude8: cut by cut_extrude8_tool
    add(cut_extrude8_tool.part, mode=Mode.SUBTRACT)


with BuildPart() as body_6_1:
    add(body_6.part)

    # Cut-Extrude8: cut by cut_extrude8_tool
    add(cut_extrude8_tool.part, mode=Mode.SUBTRACT)


solid = Compound([part.part, body_2.part, body_3.part, body_4_1.part, body_5_1.part, body_6_1.part])
